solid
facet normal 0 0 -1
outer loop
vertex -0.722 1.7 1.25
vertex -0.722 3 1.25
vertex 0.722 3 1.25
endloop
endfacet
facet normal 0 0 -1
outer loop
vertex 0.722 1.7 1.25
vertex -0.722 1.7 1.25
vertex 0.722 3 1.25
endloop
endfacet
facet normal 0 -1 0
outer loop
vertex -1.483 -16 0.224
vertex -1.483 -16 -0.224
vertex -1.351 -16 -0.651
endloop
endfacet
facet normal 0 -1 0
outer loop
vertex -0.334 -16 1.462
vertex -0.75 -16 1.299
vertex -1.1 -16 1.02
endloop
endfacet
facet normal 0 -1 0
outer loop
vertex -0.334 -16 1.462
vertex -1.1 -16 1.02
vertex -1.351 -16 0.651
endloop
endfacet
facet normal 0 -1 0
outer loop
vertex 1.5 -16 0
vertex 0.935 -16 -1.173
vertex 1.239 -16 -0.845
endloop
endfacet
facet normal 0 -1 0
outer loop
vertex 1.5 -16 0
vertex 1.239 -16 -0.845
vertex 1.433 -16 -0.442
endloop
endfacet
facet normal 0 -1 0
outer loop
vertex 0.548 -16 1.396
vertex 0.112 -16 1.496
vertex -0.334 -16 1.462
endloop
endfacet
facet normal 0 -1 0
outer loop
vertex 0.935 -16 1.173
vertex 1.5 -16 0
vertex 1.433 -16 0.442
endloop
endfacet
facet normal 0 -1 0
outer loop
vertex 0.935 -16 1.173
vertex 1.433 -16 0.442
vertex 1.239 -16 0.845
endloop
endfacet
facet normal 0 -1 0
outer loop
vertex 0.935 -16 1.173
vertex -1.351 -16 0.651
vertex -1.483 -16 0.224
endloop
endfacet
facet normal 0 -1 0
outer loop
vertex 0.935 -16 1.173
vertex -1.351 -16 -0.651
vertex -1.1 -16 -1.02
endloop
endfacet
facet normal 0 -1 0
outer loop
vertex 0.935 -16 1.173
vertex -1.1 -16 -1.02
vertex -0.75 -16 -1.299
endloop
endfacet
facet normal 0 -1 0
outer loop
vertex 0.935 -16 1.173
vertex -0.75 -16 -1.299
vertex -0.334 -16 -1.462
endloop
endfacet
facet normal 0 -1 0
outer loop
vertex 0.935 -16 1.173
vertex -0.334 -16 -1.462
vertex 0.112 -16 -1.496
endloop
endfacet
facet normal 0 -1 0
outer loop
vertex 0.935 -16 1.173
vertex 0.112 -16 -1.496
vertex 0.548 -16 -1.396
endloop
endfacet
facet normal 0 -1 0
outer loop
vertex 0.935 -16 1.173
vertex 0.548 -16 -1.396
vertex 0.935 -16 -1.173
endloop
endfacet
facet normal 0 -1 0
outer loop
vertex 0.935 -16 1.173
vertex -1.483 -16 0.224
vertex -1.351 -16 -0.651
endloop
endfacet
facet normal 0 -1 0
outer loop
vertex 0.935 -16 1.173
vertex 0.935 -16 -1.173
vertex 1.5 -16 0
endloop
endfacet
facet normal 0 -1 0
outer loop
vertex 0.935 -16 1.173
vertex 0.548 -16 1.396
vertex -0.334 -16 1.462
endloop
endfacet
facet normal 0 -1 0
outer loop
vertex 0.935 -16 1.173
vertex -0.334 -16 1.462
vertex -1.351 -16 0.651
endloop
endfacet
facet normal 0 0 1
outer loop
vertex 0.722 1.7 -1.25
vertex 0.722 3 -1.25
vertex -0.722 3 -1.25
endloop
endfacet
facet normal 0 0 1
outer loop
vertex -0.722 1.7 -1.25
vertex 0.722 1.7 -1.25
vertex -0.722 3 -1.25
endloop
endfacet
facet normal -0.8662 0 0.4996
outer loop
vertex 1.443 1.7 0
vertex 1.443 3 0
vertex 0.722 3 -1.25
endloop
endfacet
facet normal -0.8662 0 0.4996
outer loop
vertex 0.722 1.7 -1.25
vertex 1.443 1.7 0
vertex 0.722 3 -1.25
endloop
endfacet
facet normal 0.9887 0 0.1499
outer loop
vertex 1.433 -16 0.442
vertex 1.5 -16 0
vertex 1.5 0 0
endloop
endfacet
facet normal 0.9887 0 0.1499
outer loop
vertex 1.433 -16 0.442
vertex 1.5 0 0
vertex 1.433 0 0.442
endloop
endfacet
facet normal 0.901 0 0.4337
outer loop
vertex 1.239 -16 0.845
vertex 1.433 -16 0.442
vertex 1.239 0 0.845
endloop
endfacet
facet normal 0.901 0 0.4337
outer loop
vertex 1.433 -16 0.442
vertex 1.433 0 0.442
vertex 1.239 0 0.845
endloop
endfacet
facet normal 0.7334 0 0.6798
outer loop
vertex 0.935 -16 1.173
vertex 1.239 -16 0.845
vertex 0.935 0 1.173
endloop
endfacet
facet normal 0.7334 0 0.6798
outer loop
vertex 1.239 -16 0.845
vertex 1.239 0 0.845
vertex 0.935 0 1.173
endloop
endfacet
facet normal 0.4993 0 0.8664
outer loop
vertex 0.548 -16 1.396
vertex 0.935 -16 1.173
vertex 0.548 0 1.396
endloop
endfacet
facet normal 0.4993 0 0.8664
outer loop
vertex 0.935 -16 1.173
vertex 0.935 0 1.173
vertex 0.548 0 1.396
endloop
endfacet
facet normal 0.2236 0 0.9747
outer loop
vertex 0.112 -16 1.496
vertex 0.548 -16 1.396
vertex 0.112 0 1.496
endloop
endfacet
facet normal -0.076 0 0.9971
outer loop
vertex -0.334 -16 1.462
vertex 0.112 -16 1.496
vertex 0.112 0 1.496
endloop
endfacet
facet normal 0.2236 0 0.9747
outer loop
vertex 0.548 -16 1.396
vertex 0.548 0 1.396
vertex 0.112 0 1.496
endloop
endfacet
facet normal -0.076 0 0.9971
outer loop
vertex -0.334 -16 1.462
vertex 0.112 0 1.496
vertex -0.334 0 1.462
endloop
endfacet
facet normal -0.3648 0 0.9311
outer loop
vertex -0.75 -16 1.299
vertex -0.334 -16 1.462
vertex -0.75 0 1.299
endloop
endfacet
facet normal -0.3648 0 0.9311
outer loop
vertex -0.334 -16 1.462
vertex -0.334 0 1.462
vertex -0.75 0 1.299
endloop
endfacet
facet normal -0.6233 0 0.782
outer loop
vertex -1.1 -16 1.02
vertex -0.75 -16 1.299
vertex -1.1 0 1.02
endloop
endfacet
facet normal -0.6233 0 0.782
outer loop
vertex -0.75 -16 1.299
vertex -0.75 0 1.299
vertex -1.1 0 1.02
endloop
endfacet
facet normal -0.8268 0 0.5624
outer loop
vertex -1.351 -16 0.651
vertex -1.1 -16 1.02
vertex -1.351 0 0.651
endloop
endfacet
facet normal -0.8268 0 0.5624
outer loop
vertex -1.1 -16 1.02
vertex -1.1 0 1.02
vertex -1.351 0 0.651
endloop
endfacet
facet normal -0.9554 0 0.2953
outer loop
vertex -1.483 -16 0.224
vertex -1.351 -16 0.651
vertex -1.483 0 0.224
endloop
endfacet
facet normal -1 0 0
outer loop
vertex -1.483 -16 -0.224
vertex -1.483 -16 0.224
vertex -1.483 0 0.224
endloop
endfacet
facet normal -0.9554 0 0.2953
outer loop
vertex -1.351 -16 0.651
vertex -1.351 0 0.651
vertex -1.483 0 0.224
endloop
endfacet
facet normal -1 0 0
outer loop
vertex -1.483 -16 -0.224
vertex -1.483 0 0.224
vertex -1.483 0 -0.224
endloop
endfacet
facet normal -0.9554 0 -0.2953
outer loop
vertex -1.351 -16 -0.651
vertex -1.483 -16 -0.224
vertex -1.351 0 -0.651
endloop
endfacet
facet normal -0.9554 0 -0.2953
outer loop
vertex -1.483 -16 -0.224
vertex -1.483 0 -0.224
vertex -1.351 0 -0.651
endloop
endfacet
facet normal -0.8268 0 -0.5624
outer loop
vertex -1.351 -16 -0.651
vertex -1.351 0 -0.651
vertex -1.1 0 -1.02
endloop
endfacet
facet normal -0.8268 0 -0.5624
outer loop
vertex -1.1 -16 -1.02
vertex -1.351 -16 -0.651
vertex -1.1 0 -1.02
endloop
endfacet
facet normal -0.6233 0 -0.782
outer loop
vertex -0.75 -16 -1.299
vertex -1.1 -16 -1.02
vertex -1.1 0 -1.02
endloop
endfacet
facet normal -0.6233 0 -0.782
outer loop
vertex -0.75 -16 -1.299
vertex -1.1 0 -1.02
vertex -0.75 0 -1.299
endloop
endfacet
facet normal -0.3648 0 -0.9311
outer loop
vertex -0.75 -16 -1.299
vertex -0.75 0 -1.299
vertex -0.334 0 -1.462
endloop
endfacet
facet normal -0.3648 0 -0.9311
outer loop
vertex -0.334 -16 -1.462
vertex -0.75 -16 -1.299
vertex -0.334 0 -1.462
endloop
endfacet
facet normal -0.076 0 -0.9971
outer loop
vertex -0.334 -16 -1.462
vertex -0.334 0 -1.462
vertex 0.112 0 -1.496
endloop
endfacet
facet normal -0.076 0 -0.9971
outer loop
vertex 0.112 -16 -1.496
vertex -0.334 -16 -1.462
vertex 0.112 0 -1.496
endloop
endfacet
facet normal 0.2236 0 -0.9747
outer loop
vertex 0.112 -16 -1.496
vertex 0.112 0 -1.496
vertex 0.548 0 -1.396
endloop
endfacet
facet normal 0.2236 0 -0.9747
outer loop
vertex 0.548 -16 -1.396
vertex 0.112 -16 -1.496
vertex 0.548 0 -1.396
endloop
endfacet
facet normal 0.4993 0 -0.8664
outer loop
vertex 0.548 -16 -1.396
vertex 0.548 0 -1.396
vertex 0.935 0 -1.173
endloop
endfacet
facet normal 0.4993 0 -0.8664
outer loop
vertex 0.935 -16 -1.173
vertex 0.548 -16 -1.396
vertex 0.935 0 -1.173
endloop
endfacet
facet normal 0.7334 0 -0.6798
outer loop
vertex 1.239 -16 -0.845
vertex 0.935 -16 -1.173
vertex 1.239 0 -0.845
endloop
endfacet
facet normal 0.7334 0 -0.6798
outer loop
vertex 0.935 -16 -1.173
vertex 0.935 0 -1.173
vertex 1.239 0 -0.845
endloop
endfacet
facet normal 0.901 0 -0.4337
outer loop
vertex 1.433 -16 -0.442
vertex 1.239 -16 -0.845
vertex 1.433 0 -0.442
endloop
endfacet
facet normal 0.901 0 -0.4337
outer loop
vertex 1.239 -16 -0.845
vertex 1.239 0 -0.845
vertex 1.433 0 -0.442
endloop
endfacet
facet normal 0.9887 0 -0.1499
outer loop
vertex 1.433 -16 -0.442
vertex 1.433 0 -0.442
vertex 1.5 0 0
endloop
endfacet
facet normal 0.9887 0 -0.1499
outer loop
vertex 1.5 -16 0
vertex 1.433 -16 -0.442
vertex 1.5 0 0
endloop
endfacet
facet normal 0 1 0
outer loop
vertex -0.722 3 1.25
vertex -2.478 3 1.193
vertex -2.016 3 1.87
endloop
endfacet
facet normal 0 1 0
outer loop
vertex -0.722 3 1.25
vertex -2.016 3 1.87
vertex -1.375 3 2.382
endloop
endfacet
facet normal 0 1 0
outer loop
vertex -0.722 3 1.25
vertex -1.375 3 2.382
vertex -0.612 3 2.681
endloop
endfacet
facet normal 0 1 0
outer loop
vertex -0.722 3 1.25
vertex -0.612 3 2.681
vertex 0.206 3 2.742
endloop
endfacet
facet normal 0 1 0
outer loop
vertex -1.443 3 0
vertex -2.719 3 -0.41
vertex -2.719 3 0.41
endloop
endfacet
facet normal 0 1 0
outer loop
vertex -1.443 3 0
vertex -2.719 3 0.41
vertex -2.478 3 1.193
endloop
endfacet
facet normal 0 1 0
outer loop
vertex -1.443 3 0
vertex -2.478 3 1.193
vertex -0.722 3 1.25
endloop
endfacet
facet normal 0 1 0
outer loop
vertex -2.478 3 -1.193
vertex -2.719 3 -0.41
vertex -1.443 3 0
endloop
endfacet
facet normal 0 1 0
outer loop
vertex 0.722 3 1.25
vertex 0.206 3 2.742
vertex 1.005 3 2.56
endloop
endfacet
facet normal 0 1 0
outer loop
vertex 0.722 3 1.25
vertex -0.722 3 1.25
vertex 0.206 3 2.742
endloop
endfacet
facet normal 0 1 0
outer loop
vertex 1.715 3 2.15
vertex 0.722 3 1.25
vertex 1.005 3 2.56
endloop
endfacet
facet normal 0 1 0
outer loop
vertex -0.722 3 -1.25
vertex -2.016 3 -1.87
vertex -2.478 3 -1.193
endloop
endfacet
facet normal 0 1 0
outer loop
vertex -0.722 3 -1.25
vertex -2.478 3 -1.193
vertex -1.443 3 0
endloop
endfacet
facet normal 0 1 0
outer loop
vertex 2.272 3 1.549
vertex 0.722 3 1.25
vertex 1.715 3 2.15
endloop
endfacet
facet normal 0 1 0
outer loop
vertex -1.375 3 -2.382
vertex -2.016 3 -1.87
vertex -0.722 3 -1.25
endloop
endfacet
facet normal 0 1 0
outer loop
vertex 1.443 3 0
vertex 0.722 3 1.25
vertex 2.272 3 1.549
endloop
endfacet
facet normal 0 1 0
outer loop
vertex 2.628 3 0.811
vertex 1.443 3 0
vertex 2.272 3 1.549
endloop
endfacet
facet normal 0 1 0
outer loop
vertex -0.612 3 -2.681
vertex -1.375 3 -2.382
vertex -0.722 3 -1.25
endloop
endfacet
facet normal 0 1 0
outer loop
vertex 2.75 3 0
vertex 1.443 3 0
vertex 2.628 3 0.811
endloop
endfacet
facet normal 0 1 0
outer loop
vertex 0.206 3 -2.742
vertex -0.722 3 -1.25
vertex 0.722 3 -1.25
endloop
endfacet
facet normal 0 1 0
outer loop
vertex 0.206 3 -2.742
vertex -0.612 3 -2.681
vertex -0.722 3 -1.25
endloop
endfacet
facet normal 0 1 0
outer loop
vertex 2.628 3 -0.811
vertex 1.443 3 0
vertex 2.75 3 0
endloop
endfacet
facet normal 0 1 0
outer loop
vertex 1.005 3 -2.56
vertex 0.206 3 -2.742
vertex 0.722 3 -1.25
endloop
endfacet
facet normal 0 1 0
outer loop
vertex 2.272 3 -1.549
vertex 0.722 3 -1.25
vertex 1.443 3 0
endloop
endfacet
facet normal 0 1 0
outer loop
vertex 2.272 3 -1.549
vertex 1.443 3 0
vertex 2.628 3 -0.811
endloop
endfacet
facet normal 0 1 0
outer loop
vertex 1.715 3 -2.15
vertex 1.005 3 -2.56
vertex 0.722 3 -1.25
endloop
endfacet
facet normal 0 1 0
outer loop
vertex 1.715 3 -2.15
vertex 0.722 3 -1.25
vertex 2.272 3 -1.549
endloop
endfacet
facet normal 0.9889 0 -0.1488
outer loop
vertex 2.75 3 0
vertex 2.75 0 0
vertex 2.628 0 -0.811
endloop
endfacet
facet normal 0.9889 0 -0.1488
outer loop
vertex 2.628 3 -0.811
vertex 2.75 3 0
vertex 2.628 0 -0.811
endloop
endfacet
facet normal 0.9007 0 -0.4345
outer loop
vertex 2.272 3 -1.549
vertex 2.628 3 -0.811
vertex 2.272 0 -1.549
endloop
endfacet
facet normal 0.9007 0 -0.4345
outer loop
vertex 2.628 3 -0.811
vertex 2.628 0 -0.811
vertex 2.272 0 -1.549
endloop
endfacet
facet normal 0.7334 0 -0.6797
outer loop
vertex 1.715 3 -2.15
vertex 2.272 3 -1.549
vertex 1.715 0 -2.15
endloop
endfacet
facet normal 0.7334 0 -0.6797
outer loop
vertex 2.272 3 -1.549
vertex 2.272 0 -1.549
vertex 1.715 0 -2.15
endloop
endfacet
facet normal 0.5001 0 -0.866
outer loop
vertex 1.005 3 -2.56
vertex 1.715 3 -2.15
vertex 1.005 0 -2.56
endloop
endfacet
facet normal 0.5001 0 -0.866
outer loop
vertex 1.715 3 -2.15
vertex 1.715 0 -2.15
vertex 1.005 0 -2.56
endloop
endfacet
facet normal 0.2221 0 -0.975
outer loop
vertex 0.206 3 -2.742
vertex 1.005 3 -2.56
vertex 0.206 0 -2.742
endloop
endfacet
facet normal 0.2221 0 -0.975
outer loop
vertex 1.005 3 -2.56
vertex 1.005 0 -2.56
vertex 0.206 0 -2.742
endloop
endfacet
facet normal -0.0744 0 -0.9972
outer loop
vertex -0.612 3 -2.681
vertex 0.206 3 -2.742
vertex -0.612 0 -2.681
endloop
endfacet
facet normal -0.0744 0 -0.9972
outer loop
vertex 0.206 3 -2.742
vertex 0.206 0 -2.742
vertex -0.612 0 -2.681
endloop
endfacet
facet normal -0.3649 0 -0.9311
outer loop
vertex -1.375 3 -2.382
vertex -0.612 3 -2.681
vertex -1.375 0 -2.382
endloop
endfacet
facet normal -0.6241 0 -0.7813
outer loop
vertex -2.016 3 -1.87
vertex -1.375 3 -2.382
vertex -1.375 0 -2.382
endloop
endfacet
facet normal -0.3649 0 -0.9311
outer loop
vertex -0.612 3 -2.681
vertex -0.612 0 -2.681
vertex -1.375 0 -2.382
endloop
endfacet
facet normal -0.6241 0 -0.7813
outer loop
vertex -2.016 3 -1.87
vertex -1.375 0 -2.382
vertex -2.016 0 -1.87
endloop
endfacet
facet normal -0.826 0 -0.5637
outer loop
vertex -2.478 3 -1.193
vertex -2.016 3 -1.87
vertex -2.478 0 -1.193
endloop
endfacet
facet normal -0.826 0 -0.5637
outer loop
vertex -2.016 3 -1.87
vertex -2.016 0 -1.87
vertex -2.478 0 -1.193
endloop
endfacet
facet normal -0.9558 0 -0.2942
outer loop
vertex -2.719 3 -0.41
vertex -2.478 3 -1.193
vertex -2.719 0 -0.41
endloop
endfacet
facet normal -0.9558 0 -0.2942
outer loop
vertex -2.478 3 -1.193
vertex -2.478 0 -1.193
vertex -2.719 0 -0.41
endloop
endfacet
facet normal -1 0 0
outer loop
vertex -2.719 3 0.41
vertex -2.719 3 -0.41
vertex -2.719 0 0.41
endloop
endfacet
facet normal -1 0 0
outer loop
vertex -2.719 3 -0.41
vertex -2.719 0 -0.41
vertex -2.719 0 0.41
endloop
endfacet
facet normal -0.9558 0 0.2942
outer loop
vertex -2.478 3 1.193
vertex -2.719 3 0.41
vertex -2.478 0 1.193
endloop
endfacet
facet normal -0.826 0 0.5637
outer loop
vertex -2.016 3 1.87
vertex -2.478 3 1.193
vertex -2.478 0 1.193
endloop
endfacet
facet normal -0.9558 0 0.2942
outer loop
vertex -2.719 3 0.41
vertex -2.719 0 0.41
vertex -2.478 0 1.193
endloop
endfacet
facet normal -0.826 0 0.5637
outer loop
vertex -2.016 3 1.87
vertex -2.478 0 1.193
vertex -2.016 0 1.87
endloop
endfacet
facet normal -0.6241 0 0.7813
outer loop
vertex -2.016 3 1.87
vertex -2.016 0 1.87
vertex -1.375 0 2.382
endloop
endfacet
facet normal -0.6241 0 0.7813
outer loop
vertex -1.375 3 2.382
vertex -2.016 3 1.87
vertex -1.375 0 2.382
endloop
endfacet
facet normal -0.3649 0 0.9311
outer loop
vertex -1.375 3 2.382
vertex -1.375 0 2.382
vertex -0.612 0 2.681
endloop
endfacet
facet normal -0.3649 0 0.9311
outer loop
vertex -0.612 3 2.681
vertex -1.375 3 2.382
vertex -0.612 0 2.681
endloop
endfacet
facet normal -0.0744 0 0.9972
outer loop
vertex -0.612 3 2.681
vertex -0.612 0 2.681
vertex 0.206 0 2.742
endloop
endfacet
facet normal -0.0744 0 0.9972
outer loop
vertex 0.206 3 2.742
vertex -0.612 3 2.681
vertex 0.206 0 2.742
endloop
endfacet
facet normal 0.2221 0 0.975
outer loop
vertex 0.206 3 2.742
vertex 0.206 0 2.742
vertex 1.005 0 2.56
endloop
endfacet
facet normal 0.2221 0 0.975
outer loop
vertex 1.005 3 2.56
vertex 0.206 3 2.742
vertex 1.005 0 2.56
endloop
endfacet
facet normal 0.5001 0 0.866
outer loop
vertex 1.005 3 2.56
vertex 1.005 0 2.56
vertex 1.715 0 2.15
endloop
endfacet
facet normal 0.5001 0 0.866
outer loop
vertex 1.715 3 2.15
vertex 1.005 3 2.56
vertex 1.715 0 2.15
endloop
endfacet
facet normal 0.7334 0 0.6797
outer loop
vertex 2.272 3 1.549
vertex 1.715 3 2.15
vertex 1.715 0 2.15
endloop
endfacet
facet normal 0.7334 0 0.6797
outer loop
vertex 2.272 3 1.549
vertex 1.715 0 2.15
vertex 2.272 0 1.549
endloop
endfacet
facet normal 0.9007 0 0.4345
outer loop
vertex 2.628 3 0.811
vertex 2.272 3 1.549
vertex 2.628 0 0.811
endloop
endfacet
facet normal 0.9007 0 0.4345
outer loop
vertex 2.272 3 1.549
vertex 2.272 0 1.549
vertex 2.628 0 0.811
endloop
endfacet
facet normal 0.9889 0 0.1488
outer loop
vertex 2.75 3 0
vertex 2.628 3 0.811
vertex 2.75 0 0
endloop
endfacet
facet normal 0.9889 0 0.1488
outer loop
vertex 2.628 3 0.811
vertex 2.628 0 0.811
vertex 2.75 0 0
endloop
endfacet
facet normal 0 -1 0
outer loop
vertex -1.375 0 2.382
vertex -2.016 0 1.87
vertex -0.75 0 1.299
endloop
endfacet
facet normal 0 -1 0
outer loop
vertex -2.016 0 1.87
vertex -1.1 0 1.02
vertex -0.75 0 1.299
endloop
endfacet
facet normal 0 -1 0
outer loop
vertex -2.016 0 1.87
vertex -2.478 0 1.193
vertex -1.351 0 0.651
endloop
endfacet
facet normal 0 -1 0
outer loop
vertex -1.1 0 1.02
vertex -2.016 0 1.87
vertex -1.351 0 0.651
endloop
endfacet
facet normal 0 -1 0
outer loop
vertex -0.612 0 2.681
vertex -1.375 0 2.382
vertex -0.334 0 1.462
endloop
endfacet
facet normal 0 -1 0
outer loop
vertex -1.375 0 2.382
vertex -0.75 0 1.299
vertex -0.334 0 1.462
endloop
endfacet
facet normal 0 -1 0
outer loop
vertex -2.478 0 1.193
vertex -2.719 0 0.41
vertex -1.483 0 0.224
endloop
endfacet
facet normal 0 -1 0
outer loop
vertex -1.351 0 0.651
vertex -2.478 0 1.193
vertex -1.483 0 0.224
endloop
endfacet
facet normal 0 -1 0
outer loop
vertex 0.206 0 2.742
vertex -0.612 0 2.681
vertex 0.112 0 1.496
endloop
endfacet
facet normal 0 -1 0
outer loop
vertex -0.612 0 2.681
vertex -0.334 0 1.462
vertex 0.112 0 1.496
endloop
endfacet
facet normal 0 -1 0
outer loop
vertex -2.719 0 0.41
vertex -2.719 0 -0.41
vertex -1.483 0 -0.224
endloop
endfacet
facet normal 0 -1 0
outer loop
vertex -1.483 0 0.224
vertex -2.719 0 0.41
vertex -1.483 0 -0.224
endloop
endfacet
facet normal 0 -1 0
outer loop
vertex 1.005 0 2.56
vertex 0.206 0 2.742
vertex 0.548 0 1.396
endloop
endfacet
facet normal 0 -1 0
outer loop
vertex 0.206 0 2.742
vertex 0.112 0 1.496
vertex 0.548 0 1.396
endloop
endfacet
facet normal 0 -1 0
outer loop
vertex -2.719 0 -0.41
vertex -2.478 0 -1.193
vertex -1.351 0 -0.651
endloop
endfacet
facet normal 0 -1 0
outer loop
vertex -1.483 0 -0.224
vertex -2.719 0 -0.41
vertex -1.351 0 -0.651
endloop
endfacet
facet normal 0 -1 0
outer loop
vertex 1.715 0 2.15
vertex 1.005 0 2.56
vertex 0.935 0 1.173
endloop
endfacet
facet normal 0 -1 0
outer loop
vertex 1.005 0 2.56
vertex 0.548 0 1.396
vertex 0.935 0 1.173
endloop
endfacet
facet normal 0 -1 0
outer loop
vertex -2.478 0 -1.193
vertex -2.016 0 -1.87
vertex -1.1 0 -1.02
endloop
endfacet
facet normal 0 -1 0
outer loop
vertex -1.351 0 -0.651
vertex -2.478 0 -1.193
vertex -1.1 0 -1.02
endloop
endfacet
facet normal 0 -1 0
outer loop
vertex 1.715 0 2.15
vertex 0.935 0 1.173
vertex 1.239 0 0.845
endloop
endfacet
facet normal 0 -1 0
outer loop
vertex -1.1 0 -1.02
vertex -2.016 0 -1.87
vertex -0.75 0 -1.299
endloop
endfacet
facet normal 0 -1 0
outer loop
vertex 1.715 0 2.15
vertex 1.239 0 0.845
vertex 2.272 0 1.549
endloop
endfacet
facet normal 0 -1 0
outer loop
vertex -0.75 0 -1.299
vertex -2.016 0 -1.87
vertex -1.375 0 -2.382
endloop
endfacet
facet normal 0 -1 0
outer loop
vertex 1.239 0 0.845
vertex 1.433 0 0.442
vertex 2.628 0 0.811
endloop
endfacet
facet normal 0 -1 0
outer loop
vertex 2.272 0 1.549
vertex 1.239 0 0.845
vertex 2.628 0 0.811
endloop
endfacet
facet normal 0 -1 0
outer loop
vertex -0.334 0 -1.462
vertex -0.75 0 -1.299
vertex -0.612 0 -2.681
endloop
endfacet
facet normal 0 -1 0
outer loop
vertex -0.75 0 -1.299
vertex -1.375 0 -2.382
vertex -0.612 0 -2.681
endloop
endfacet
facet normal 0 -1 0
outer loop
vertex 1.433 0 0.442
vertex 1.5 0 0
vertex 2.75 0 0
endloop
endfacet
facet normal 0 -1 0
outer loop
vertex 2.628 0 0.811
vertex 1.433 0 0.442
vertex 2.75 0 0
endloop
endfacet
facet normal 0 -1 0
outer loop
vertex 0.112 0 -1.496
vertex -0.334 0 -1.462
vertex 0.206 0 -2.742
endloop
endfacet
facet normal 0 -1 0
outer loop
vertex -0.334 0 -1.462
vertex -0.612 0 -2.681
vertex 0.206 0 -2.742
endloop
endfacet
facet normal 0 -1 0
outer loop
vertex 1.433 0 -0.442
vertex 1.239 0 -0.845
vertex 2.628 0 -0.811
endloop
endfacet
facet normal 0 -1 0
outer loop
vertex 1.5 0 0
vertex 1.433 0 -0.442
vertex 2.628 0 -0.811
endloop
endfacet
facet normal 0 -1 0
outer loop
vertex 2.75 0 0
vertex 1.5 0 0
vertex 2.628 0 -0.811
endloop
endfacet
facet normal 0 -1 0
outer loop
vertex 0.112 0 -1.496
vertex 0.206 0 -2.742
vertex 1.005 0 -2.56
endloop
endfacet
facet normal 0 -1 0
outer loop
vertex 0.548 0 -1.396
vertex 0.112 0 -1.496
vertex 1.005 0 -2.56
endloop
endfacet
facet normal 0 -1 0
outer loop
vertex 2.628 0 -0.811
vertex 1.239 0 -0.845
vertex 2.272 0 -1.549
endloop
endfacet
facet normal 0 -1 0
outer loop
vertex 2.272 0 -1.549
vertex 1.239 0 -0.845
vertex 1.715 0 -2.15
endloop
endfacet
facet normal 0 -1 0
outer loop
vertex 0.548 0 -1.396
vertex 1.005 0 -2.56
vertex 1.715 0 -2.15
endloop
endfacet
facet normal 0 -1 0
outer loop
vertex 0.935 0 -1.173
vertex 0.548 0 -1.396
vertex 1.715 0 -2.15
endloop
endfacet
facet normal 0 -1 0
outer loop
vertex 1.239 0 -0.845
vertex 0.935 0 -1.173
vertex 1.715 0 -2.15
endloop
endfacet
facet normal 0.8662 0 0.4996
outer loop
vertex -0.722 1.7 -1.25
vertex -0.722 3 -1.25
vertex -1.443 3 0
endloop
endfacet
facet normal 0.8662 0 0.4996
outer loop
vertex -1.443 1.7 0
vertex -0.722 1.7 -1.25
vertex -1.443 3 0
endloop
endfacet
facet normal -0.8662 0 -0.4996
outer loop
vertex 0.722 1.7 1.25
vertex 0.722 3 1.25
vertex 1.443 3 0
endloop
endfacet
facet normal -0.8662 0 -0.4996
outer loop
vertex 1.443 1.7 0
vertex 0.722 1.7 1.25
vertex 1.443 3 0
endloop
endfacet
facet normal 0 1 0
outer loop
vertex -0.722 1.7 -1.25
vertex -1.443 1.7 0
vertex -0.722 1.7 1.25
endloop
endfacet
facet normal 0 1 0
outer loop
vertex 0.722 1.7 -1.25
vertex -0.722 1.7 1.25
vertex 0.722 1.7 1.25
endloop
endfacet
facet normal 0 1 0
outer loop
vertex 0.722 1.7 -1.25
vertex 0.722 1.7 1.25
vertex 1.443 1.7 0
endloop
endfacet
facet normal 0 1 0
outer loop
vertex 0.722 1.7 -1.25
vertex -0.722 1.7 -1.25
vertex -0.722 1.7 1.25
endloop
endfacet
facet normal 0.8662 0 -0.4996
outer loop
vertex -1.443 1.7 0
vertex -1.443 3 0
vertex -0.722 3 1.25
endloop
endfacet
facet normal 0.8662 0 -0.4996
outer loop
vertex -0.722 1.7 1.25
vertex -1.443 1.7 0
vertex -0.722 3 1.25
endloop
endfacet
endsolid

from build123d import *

# Parameters (mm, degrees)
SKETCH_1_R            = 2.75
EXTRUDE_248_DEPTH     = 3
CUT_EXTRUDE_378_DEPTH = 1.3
SKETCH_3_R            = 1.5
EXTRUDE_479_DEPTH     = 16


with BuildPart() as part:
    # 草图1 → Extrude 248 (new body)
    with BuildSketch(Plane(origin=(0, 0, 0), x_dir=(1, 0, 0), z_dir=(0, 1, 0))):
        Circle(SKETCH_1_R)
    extrude(amount=EXTRUDE_248_DEPTH)

    # 草图2 → Cut-Extrude 378 (cut)
    with BuildSketch(Plane(origin=(0, 3, 0), x_dir=(1, 0, 0), z_dir=(0, 1, 0))):
        Polygon((1.443375673, 0), (0.721687836, 1.25), (-0.721687836, 1.25), (-1.443375673, 0), (-0.721687836, -1.25), (0.721687836, -1.25), align=None)
    extrude(amount=-CUT_EXTRUDE_378_DEPTH, mode=Mode.SUBTRACT)

    # 草图3 → Extrude 479 (add)
    with BuildSketch(Plane.XZ):
        Circle(SKETCH_3_R)
    extrude(amount=EXTRUDE_479_DEPTH)


solid = part.part
